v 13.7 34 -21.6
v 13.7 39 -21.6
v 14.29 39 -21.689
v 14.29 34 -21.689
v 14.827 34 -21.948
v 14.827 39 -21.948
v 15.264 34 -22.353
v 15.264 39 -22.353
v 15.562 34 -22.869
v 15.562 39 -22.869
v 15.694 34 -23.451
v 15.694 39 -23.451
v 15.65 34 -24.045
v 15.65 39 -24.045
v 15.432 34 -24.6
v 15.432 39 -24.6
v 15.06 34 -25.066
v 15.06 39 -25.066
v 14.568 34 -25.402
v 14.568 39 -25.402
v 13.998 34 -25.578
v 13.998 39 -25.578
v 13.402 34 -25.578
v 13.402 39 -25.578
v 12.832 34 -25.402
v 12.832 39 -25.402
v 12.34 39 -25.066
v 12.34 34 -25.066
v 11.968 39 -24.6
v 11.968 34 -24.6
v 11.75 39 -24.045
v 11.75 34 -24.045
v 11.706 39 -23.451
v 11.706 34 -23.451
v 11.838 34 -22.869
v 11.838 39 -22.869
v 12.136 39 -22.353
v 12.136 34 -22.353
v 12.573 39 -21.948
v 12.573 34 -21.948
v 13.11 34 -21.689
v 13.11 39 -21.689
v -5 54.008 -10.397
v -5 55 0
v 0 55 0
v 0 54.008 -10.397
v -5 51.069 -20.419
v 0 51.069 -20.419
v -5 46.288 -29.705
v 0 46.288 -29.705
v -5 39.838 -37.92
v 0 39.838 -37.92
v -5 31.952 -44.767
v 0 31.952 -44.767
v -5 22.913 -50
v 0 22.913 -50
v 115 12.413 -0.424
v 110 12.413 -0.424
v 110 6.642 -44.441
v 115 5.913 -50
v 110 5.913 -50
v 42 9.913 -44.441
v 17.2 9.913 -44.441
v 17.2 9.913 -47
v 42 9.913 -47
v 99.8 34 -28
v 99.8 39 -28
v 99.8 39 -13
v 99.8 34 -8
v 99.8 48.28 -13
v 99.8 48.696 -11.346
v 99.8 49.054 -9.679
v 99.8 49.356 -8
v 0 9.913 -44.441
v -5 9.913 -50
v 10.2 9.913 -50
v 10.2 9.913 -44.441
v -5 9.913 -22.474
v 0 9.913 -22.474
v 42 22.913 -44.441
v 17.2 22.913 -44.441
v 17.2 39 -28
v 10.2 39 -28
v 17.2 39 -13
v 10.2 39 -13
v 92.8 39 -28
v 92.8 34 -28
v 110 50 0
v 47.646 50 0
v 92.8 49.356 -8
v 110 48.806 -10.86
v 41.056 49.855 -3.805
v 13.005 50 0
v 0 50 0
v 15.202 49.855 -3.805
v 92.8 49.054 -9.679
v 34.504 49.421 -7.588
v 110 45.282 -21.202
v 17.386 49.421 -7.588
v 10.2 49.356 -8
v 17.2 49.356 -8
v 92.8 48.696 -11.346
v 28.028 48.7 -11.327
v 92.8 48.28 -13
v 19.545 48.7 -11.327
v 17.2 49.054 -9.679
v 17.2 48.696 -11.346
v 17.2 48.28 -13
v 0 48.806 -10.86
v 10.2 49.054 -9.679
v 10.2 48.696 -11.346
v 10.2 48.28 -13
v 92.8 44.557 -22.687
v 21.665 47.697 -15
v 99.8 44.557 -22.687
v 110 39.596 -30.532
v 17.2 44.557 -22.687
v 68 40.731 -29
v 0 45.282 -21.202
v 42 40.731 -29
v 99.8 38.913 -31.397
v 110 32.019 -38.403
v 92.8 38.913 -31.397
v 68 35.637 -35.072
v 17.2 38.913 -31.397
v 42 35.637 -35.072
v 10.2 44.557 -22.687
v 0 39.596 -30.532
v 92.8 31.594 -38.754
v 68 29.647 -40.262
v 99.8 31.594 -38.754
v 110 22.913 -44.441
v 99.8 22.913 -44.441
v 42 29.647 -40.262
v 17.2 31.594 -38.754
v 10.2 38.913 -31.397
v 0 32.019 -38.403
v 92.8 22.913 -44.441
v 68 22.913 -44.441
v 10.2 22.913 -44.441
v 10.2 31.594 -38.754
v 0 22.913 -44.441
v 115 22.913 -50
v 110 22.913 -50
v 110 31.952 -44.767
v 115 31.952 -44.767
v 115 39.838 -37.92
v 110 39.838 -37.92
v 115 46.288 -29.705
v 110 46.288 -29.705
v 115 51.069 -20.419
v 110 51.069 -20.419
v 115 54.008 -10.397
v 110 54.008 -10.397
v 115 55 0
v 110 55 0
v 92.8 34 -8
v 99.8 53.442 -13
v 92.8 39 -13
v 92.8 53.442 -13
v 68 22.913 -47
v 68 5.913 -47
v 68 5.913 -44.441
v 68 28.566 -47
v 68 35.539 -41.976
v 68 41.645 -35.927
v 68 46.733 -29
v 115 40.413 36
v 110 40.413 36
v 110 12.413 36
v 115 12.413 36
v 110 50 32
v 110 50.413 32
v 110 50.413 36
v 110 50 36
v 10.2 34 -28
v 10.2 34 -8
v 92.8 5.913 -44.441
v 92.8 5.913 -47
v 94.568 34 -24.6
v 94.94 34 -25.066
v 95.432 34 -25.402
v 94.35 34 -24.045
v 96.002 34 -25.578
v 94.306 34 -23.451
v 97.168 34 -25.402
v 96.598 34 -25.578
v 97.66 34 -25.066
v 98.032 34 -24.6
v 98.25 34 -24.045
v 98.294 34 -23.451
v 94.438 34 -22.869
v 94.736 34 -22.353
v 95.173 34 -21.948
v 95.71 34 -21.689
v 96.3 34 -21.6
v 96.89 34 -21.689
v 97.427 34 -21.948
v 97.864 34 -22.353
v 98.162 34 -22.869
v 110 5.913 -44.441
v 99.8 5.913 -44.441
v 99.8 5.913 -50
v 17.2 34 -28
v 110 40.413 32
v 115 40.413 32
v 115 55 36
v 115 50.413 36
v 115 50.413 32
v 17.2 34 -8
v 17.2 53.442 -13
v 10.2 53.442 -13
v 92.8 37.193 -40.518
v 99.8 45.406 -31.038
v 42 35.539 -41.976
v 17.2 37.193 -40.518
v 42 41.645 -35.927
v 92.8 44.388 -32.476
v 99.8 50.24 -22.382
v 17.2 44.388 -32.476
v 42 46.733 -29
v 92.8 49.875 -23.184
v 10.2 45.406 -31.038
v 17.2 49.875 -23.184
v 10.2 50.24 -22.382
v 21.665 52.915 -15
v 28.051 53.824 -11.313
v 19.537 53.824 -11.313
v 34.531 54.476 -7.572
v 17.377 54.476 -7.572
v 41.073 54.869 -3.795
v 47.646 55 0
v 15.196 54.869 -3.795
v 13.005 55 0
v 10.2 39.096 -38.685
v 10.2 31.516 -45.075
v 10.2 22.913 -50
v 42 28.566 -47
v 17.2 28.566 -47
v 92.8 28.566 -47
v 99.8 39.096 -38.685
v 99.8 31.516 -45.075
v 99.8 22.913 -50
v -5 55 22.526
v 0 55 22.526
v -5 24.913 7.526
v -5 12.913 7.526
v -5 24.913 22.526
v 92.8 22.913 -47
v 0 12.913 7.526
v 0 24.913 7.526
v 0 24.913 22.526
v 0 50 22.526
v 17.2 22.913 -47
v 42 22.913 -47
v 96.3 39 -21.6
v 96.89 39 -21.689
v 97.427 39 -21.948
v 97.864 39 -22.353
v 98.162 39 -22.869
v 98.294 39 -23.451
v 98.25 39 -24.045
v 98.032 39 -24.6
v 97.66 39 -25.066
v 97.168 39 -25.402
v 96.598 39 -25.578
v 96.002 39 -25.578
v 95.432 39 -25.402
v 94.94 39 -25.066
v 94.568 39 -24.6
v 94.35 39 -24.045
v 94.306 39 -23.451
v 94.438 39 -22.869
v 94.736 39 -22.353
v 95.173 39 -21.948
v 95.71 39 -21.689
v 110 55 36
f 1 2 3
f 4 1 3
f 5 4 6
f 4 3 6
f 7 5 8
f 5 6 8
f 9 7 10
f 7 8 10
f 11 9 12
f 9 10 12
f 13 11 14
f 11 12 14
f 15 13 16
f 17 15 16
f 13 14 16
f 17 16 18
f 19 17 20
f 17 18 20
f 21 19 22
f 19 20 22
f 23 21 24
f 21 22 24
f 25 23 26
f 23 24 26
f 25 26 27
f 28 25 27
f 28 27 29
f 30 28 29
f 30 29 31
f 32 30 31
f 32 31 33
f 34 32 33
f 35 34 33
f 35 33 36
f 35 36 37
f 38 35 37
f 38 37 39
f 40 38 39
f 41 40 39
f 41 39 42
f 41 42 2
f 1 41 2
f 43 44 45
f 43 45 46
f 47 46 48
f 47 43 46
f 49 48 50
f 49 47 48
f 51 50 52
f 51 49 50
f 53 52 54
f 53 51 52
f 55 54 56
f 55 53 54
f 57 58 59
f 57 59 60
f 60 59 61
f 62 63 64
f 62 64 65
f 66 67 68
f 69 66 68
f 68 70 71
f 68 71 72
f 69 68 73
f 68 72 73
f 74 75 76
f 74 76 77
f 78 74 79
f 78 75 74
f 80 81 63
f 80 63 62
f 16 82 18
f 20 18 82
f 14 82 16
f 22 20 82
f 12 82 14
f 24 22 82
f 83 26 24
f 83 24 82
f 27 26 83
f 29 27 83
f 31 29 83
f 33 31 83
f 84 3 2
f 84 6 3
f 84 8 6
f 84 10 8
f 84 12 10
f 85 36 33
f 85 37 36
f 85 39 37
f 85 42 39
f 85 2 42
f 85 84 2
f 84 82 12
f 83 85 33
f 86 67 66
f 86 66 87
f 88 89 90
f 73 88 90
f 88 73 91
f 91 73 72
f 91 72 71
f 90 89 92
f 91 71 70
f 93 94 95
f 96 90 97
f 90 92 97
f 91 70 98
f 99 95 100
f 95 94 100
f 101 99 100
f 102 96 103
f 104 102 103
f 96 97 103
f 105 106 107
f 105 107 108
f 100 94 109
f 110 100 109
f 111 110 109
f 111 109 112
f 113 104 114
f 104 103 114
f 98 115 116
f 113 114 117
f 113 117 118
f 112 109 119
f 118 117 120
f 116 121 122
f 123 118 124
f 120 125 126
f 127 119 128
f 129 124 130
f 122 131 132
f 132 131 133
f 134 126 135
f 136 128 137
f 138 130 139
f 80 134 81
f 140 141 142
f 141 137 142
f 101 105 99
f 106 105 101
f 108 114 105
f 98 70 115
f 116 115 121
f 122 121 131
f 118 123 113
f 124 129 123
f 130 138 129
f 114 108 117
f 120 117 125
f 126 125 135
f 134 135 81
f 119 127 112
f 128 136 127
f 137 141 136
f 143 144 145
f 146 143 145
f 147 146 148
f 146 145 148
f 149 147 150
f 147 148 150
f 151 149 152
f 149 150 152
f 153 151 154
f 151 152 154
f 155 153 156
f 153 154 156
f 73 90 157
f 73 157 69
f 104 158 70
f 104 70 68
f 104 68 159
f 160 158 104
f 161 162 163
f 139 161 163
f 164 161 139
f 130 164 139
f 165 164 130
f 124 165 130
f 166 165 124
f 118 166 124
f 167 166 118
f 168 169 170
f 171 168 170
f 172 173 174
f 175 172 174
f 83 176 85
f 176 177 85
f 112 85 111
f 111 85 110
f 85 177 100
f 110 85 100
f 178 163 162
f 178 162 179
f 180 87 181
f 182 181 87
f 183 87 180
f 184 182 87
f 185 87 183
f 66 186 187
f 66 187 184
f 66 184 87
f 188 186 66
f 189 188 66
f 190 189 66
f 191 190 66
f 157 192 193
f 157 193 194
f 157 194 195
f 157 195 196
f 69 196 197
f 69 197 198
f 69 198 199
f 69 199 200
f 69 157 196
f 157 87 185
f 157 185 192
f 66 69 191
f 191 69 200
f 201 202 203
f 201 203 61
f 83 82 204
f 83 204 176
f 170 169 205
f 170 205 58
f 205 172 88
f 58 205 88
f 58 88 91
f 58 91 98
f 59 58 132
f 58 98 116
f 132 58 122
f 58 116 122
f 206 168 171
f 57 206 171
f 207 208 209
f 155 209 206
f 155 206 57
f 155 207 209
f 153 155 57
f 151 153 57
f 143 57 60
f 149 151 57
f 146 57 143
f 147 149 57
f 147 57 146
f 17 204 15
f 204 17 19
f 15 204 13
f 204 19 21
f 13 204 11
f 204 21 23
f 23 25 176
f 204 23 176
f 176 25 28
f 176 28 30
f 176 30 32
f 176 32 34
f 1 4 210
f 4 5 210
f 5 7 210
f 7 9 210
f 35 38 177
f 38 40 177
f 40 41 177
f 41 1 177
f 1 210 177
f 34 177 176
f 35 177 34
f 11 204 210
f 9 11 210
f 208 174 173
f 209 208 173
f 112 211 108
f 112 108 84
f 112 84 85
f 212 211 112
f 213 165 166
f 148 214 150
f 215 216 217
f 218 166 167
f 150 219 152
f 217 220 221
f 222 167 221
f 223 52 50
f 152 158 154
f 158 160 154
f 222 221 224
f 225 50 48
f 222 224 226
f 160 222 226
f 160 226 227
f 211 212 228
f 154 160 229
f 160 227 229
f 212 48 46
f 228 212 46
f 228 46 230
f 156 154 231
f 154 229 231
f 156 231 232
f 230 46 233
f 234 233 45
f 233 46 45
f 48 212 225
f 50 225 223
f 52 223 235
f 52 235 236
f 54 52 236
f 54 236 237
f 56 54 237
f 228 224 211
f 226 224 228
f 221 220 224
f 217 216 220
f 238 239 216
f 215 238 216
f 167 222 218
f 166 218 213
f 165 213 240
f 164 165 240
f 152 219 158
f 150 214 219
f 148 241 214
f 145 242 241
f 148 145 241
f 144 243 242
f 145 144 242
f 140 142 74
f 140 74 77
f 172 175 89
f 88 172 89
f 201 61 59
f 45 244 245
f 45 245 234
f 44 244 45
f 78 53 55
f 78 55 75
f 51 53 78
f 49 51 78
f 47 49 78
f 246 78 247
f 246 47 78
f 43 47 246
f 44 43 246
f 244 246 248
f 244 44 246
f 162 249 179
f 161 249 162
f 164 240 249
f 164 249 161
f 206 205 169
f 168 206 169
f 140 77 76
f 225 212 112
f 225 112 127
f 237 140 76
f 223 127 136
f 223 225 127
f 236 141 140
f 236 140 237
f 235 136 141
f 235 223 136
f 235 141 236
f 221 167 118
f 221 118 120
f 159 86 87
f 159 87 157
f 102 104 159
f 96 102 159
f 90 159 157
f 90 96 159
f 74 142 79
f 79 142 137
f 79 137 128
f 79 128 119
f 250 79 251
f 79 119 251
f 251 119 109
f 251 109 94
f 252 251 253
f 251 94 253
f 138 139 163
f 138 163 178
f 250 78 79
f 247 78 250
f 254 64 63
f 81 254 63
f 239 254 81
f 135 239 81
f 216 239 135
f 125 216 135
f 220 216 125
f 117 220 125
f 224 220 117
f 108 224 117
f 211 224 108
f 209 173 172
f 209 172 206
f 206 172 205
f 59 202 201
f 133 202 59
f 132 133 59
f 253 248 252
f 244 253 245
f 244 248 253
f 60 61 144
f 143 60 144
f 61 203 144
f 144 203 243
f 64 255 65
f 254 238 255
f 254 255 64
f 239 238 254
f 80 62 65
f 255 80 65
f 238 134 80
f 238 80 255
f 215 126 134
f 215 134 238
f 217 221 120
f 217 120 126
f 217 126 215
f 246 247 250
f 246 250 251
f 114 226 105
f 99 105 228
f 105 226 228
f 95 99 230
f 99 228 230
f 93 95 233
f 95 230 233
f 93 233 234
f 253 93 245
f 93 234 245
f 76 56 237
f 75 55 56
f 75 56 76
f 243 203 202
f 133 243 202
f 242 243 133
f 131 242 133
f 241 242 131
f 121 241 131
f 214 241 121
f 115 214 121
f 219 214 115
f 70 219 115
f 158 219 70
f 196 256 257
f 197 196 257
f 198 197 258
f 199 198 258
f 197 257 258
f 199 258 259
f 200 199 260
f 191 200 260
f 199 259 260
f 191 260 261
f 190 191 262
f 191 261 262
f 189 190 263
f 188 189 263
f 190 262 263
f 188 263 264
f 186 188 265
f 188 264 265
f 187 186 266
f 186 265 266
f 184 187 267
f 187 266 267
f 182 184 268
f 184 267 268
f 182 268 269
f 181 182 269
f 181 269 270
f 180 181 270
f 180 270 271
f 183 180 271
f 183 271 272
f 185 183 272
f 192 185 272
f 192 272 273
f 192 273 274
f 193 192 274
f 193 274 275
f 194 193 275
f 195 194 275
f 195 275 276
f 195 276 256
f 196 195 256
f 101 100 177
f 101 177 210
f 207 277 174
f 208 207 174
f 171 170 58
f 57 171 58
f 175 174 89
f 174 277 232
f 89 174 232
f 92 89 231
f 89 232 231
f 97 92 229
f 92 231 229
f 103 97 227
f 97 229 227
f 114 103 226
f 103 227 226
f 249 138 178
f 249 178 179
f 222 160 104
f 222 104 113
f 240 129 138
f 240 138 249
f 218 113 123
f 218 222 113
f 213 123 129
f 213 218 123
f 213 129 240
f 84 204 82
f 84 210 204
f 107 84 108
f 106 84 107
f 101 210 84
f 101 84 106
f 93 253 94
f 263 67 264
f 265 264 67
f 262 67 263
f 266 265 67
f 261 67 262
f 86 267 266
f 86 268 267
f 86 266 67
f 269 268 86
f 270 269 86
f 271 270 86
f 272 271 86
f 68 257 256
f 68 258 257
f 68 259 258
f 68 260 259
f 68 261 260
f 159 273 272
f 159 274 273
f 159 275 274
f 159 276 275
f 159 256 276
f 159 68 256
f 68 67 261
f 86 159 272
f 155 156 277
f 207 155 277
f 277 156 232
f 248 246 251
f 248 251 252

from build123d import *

# Parameters (mm, degrees)
BOSS_EXTRUDE1_DEPTH = 110
CUT_EXTRUDE1_DEPTH  = 110
SKETCH3_W           = 110
SKETCH3_H           = 22.912878475
CUT_EXTRUDE2_DEPTH  = 110
SKETCH4_W           = 10.2
SKETCH4_H           = 5.559027913
SKETCH4_W_2         = 24.8
SKETCH4_H_2         = 2.559027913
BOSS_EXTRUDE2_DEPTH = 13
SKETCH5_W           = 7
SKETCH5_H           = 5
BOSS_EXTRUDE3_DEPTH = 16
SKETCH6_W           = 10.2
SKETCH6_H           = 5.559027913
SKETCH6_W_2         = 24.8
SKETCH6_H_2         = 2.559027913
BOSS_EXTRUDE4_DEPTH = 4
CUT_EXTRUDE3_DEPTH  = 64
SKETCH8_W           = 7
SKETCH8_H           = 5
BOSS_EXTRUDE5_DEPTH = 15
SKETCH9_R           = 2
CUT_EXTRUDE4_DEPTH  = 10
BOSS_EXTRUDE6_START = 5
BOSS_EXTRUDE6_DEPTH = 5
BOSS_EXTRUDE7_DEPTH = 5


with BuildPart() as part:
    # Sketch1 → Boss-Extrude1 (new body)
    with BuildSketch(Plane(origin=(0, 0, 0), x_dir=(0, 0, -1), z_dir=(1, 0, 0))):
        with BuildLine():
            Line((0, 55), (-36, 55))
            Line((-36, 55), (-36, 50))
            Line((-36, 50), (0, 50))
            ThreePointArc((0, 50), (35.355339059, 35.355339059), (50, 0))
            Line((50, 0), (50, -1))
            Line((50, -1), (55, -1))
            Line((55, -1), (55, 0))
            ThreePointArc((55, 0), (38.890872965, 38.890872965), (0, 55))
        make_face()
    extrude(amount=BOSS_EXTRUDE1_DEPTH)

    # Sketch2 → Cut-Extrude1 (cut)
    with BuildSketch(Plane(origin=(0, 55, 0), x_dir=(1, 0, 0), z_dir=(0, 1, 0))):
        Polygon((99.8, 13), (92.8, 13), (92.8, 47), (68, 47), (68, 29), (42, 29), (42, 47), (17.2, 47), (17.2, 13), (10.2, 13), (10.2, 50), (-27.805612869, 50), (-27.805612869, 77.075699265), (114.223867828, 77.075699265), (114.223867828, 50), (99.8, 50), align=None)
    extrude(amount=-CUT_EXTRUDE1_DEPTH, mode=Mode.SUBTRACT)

    # Sketch3 → Cut-Extrude2 (cut)
    with BuildSketch(Plane(origin=(0, 0, -50), x_dir=(-1, 0, 0), z_dir=(0, 0, -1))):
        with Locations((-55, 11.456439238)):
            Rectangle(SKETCH3_W, SKETCH3_H)
    extrude(amount=-CUT_EXTRUDE2_DEPTH, mode=Mode.SUBTRACT)

    # Sketch4 → Boss-Extrude2 (add)
    with BuildSketch(Plane.XZ.offset(-22.912878475)):
        with Locations((104.9, -47.220486044)):
            Rectangle(SKETCH4_W, SKETCH4_H)
        with Locations((80.4, -45.720486044)):
            Rectangle(SKETCH4_W_2, SKETCH4_H_2)
        with Locations((29.6, -45.720486044)):
            Rectangle(SKETCH4_W_2, SKETCH4_H_2)
        with Locations((5.1, -47.220486044)):
            Rectangle(SKETCH4_W, SKETCH4_H)
    extrude(amount=BOSS_EXTRUDE2_DEPTH)

    # Sketch5 → Boss-Extrude3 (add)
    with BuildSketch(Plane.XZ.offset(-50)):
        with Locations((13.7, -10.5)):
            Rectangle(SKETCH5_W, SKETCH5_H)
        with Locations((96.3, -10.5)):
            Rectangle(SKETCH5_W, SKETCH5_H)
    extrude(amount=BOSS_EXTRUDE3_DEPTH)

    # Sketch6 → Boss-Extrude4 (add)
    with BuildSketch(Plane.XZ.offset(-9.912878475)):
        with Locations((104.9, -47.220486044)):
            Rectangle(SKETCH6_W, SKETCH6_H)
        with Locations((80.4, -45.720486044)):
            Rectangle(SKETCH6_W_2, SKETCH6_H_2)
    extrude(amount=BOSS_EXTRUDE4_DEPTH)

    # Sketch7 → Cut-Extrude3 (cut)
    with BuildSketch(Plane(origin=(0, 55, 0), x_dir=(1, 0, 0), z_dir=(0, 1, 0))):
        Polygon((110, -36), (21.665408814, 15), (0, -22.525588833), (0, -36), align=None)
    extrude(amount=-CUT_EXTRUDE3_DEPTH, mode=Mode.SUBTRACT)

    # Sketch8 → Boss-Extrude5 (add)
    with BuildSketch(Plane(origin=(0, 0, -13), x_dir=(-1, 0, 0), z_dir=(0, 0, -1))):
        with Locations((-13.7, 36.5)):
            Rectangle(SKETCH8_W, SKETCH8_H)
        with Locations((-96.3, 36.5)):
            Rectangle(SKETCH8_W, SKETCH8_H)
    extrude(amount=BOSS_EXTRUDE5_DEPTH)

    # Sketch9 → Cut-Extrude4 (cut)
    with BuildSketch(Plane(origin=(0, 39, 0), x_dir=(1, 0, 0), z_dir=(0, 1, 0))):
        with Locations(Location((13.7, 23.6, 0), (0, 0, 270))):
            Circle(SKETCH9_R)
        with Locations(Location((96.3, 23.6, 0), (0, 0, 270))):
            Circle(SKETCH9_R)
    extrude(amount=-CUT_EXTRUDE4_DEPTH, mode=Mode.SUBTRACT)

    # Sketch10 → Boss-Extrude6 (add)
    with BuildSketch(Plane.ZY.offset(BOSS_EXTRUDE6_START)):
        with BuildLine():
            Line((-50, 9.912878475), (-22.474411167, 9.912878475))
            Line((-22.474411167, 9.912878475), (7.525588833, 12.912878475))
            Line((7.525588833, 12.912878475), (7.525588833, 24.912878475))
            Line((7.525588833, 24.912878475), (22.525588833, 24.912878475))
            Line((22.525588833, 24.912878475), (22.525588833, 55))
            Line((22.525588833, 55), (0, 55))
            ThreePointArc((0, 55), (-29.705148408, 46.28827236), (-50, 22.912878475))
            Line((-50, 22.912878475), (-50, 9.912878475))
        make_face()
    extrude(amount=-BOSS_EXTRUDE6_DEPTH)

    # Sketch11 → Boss-Extrude7 (add)
    with BuildSketch(Plane(origin=(110, 0, 0), x_dir=(0, 0, -1), z_dir=(1, 0, 0))):
        with BuildLine():
            Line((-36, 50.412878475), (-32, 50.412878475))
            Line((-32, 50.412878475), (-32, 40.412878475))
            Line((-32, 40.412878475), (-36, 40.412878475))
            Line((-36, 40.412878475), (-36, 12.412878475))
            Line((-36, 12.412878475), (0.424300308, 12.412878475))
            Line((0.424300308, 12.412878475), (50, 5.912878475))
            Line((50, 5.912878475), (50, 22.912878475))
            ThreePointArc((50, 22.912878475), (29.705148408, 46.28827236), (0, 55))
            Line((0, 55), (-36, 55))
            Line((-36, 55), (-36, 50.412878475))
        make_face()
    extrude(amount=BOSS_EXTRUDE7_DEPTH)


solid = part.part
